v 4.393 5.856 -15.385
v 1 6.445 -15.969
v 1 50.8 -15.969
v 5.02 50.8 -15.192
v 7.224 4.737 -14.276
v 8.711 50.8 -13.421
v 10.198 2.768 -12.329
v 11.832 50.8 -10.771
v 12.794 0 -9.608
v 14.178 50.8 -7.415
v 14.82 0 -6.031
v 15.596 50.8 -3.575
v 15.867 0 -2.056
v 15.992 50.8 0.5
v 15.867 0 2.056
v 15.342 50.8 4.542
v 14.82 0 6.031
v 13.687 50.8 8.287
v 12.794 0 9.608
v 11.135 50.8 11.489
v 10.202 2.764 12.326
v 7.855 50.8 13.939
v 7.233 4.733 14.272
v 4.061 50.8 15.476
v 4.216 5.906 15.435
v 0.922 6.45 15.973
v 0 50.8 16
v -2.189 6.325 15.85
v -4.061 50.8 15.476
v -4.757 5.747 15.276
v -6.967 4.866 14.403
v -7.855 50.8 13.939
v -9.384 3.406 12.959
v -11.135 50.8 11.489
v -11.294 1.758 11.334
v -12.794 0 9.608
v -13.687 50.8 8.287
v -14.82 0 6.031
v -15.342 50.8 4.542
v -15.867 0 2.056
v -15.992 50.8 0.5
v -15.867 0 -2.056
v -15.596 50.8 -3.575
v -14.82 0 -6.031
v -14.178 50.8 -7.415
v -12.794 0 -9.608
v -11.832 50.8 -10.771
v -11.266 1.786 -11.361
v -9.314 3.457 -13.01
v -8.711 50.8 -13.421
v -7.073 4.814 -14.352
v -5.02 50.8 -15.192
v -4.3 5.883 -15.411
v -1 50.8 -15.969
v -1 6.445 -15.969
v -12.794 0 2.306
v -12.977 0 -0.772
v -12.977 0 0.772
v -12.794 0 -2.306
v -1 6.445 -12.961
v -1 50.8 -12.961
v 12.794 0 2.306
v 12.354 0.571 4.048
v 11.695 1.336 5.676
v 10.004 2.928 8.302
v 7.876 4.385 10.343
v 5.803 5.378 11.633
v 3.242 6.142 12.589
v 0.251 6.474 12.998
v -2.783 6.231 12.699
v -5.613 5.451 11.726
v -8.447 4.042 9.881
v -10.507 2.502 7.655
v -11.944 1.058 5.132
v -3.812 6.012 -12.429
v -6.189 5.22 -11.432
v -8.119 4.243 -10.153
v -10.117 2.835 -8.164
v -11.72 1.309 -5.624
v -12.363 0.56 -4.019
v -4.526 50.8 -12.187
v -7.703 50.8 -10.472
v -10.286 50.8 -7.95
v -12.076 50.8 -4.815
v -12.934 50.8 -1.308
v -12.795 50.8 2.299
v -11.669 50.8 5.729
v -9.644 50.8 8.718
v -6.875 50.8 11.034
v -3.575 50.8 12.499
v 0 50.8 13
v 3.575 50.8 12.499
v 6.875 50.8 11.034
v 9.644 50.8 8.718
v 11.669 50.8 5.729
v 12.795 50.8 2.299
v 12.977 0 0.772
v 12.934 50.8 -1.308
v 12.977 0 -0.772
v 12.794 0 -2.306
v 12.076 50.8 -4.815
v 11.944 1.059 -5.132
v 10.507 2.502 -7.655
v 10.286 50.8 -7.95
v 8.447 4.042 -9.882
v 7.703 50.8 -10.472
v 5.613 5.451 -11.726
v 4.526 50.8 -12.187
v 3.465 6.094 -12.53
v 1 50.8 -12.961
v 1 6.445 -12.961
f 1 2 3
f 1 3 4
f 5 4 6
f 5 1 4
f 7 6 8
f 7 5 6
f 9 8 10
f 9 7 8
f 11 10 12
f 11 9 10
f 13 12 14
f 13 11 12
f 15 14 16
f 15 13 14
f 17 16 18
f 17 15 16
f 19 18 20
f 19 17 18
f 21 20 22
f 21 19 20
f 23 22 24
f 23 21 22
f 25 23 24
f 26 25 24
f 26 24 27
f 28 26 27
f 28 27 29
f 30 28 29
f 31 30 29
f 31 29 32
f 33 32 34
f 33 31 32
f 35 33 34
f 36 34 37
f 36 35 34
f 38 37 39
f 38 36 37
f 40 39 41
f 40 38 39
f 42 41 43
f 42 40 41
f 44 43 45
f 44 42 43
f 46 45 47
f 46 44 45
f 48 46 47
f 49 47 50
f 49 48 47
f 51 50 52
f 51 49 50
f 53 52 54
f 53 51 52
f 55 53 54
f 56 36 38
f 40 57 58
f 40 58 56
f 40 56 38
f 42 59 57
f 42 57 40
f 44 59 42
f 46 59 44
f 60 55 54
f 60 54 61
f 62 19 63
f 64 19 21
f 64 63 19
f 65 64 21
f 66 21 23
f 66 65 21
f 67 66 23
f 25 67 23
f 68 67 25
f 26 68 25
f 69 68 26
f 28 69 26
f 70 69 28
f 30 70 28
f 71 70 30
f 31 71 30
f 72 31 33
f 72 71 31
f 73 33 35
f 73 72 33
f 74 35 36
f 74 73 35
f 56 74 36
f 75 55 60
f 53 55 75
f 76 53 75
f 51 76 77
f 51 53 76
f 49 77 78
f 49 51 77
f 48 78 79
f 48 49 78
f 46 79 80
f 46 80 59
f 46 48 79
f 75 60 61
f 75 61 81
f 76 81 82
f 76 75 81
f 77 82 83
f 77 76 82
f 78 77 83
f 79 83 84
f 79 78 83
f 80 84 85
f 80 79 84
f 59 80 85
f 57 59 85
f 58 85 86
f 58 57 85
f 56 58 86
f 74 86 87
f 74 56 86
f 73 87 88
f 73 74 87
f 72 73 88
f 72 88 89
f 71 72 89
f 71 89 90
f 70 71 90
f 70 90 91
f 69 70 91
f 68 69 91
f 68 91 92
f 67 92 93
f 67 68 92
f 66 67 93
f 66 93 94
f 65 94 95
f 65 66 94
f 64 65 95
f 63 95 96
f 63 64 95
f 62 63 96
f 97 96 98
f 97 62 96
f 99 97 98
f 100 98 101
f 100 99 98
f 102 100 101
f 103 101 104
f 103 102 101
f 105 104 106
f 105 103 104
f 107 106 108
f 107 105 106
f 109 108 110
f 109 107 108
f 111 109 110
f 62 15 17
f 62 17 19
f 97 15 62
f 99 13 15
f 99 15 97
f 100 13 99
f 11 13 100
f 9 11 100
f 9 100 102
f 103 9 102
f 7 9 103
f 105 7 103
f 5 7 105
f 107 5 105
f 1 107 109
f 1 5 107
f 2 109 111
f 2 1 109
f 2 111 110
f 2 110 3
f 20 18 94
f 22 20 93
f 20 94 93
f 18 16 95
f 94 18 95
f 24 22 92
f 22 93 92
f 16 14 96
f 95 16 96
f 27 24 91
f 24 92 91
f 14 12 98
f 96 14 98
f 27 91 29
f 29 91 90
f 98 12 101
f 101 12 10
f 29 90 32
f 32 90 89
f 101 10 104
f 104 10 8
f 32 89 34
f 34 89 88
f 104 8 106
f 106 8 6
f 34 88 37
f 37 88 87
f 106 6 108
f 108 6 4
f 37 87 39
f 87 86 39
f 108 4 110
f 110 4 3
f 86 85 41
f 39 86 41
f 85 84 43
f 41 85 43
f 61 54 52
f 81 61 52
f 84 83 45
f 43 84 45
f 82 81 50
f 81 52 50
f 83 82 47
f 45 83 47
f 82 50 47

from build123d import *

# Parameters (mm, degrees)
BOSS_EXTRUDE1_DEPTH     = 50.8
CUT_EXTRUDE1_DEPTH      = 50.8
CUT_EXTRUDE1_DEPTH_BACK = 50.8
SKETCH2_R               = 15.875


with BuildPart() as part:
    # Sketch1 → Boss-Extrude1 (new body)
    with BuildSketch(Plane(origin=(0, 0, 0), x_dir=(1, 0, 0), z_dir=(0, 1, 0))):
        with BuildLine():
            Line((-1, 15.968719423), (-1, 12.961481397))
            ThreePointArc((-1, 12.961481397), (0, -13), (1, 12.961481397))
            Line((1, 12.961481397), (1, 15.968719423))
            ThreePointArc((1, 15.968719423), (0, -16), (-1, 15.968719423))
        make_face()
    extrude(amount=BOSS_EXTRUDE1_DEPTH)

    # Sketch2 → Cut-Extrude1 (cut, two sides: drawn at the far end of the back side and taken through both)
    with BuildSketch(Plane.XY.offset(-CUT_EXTRUDE1_DEPTH_BACK)):
        with Locations((0, -9.398568911)):
            Circle(SKETCH2_R)
    extrude(amount=CUT_EXTRUDE1_DEPTH + CUT_EXTRUDE1_DEPTH_BACK, mode=Mode.SUBTRACT)


solid = part.part
